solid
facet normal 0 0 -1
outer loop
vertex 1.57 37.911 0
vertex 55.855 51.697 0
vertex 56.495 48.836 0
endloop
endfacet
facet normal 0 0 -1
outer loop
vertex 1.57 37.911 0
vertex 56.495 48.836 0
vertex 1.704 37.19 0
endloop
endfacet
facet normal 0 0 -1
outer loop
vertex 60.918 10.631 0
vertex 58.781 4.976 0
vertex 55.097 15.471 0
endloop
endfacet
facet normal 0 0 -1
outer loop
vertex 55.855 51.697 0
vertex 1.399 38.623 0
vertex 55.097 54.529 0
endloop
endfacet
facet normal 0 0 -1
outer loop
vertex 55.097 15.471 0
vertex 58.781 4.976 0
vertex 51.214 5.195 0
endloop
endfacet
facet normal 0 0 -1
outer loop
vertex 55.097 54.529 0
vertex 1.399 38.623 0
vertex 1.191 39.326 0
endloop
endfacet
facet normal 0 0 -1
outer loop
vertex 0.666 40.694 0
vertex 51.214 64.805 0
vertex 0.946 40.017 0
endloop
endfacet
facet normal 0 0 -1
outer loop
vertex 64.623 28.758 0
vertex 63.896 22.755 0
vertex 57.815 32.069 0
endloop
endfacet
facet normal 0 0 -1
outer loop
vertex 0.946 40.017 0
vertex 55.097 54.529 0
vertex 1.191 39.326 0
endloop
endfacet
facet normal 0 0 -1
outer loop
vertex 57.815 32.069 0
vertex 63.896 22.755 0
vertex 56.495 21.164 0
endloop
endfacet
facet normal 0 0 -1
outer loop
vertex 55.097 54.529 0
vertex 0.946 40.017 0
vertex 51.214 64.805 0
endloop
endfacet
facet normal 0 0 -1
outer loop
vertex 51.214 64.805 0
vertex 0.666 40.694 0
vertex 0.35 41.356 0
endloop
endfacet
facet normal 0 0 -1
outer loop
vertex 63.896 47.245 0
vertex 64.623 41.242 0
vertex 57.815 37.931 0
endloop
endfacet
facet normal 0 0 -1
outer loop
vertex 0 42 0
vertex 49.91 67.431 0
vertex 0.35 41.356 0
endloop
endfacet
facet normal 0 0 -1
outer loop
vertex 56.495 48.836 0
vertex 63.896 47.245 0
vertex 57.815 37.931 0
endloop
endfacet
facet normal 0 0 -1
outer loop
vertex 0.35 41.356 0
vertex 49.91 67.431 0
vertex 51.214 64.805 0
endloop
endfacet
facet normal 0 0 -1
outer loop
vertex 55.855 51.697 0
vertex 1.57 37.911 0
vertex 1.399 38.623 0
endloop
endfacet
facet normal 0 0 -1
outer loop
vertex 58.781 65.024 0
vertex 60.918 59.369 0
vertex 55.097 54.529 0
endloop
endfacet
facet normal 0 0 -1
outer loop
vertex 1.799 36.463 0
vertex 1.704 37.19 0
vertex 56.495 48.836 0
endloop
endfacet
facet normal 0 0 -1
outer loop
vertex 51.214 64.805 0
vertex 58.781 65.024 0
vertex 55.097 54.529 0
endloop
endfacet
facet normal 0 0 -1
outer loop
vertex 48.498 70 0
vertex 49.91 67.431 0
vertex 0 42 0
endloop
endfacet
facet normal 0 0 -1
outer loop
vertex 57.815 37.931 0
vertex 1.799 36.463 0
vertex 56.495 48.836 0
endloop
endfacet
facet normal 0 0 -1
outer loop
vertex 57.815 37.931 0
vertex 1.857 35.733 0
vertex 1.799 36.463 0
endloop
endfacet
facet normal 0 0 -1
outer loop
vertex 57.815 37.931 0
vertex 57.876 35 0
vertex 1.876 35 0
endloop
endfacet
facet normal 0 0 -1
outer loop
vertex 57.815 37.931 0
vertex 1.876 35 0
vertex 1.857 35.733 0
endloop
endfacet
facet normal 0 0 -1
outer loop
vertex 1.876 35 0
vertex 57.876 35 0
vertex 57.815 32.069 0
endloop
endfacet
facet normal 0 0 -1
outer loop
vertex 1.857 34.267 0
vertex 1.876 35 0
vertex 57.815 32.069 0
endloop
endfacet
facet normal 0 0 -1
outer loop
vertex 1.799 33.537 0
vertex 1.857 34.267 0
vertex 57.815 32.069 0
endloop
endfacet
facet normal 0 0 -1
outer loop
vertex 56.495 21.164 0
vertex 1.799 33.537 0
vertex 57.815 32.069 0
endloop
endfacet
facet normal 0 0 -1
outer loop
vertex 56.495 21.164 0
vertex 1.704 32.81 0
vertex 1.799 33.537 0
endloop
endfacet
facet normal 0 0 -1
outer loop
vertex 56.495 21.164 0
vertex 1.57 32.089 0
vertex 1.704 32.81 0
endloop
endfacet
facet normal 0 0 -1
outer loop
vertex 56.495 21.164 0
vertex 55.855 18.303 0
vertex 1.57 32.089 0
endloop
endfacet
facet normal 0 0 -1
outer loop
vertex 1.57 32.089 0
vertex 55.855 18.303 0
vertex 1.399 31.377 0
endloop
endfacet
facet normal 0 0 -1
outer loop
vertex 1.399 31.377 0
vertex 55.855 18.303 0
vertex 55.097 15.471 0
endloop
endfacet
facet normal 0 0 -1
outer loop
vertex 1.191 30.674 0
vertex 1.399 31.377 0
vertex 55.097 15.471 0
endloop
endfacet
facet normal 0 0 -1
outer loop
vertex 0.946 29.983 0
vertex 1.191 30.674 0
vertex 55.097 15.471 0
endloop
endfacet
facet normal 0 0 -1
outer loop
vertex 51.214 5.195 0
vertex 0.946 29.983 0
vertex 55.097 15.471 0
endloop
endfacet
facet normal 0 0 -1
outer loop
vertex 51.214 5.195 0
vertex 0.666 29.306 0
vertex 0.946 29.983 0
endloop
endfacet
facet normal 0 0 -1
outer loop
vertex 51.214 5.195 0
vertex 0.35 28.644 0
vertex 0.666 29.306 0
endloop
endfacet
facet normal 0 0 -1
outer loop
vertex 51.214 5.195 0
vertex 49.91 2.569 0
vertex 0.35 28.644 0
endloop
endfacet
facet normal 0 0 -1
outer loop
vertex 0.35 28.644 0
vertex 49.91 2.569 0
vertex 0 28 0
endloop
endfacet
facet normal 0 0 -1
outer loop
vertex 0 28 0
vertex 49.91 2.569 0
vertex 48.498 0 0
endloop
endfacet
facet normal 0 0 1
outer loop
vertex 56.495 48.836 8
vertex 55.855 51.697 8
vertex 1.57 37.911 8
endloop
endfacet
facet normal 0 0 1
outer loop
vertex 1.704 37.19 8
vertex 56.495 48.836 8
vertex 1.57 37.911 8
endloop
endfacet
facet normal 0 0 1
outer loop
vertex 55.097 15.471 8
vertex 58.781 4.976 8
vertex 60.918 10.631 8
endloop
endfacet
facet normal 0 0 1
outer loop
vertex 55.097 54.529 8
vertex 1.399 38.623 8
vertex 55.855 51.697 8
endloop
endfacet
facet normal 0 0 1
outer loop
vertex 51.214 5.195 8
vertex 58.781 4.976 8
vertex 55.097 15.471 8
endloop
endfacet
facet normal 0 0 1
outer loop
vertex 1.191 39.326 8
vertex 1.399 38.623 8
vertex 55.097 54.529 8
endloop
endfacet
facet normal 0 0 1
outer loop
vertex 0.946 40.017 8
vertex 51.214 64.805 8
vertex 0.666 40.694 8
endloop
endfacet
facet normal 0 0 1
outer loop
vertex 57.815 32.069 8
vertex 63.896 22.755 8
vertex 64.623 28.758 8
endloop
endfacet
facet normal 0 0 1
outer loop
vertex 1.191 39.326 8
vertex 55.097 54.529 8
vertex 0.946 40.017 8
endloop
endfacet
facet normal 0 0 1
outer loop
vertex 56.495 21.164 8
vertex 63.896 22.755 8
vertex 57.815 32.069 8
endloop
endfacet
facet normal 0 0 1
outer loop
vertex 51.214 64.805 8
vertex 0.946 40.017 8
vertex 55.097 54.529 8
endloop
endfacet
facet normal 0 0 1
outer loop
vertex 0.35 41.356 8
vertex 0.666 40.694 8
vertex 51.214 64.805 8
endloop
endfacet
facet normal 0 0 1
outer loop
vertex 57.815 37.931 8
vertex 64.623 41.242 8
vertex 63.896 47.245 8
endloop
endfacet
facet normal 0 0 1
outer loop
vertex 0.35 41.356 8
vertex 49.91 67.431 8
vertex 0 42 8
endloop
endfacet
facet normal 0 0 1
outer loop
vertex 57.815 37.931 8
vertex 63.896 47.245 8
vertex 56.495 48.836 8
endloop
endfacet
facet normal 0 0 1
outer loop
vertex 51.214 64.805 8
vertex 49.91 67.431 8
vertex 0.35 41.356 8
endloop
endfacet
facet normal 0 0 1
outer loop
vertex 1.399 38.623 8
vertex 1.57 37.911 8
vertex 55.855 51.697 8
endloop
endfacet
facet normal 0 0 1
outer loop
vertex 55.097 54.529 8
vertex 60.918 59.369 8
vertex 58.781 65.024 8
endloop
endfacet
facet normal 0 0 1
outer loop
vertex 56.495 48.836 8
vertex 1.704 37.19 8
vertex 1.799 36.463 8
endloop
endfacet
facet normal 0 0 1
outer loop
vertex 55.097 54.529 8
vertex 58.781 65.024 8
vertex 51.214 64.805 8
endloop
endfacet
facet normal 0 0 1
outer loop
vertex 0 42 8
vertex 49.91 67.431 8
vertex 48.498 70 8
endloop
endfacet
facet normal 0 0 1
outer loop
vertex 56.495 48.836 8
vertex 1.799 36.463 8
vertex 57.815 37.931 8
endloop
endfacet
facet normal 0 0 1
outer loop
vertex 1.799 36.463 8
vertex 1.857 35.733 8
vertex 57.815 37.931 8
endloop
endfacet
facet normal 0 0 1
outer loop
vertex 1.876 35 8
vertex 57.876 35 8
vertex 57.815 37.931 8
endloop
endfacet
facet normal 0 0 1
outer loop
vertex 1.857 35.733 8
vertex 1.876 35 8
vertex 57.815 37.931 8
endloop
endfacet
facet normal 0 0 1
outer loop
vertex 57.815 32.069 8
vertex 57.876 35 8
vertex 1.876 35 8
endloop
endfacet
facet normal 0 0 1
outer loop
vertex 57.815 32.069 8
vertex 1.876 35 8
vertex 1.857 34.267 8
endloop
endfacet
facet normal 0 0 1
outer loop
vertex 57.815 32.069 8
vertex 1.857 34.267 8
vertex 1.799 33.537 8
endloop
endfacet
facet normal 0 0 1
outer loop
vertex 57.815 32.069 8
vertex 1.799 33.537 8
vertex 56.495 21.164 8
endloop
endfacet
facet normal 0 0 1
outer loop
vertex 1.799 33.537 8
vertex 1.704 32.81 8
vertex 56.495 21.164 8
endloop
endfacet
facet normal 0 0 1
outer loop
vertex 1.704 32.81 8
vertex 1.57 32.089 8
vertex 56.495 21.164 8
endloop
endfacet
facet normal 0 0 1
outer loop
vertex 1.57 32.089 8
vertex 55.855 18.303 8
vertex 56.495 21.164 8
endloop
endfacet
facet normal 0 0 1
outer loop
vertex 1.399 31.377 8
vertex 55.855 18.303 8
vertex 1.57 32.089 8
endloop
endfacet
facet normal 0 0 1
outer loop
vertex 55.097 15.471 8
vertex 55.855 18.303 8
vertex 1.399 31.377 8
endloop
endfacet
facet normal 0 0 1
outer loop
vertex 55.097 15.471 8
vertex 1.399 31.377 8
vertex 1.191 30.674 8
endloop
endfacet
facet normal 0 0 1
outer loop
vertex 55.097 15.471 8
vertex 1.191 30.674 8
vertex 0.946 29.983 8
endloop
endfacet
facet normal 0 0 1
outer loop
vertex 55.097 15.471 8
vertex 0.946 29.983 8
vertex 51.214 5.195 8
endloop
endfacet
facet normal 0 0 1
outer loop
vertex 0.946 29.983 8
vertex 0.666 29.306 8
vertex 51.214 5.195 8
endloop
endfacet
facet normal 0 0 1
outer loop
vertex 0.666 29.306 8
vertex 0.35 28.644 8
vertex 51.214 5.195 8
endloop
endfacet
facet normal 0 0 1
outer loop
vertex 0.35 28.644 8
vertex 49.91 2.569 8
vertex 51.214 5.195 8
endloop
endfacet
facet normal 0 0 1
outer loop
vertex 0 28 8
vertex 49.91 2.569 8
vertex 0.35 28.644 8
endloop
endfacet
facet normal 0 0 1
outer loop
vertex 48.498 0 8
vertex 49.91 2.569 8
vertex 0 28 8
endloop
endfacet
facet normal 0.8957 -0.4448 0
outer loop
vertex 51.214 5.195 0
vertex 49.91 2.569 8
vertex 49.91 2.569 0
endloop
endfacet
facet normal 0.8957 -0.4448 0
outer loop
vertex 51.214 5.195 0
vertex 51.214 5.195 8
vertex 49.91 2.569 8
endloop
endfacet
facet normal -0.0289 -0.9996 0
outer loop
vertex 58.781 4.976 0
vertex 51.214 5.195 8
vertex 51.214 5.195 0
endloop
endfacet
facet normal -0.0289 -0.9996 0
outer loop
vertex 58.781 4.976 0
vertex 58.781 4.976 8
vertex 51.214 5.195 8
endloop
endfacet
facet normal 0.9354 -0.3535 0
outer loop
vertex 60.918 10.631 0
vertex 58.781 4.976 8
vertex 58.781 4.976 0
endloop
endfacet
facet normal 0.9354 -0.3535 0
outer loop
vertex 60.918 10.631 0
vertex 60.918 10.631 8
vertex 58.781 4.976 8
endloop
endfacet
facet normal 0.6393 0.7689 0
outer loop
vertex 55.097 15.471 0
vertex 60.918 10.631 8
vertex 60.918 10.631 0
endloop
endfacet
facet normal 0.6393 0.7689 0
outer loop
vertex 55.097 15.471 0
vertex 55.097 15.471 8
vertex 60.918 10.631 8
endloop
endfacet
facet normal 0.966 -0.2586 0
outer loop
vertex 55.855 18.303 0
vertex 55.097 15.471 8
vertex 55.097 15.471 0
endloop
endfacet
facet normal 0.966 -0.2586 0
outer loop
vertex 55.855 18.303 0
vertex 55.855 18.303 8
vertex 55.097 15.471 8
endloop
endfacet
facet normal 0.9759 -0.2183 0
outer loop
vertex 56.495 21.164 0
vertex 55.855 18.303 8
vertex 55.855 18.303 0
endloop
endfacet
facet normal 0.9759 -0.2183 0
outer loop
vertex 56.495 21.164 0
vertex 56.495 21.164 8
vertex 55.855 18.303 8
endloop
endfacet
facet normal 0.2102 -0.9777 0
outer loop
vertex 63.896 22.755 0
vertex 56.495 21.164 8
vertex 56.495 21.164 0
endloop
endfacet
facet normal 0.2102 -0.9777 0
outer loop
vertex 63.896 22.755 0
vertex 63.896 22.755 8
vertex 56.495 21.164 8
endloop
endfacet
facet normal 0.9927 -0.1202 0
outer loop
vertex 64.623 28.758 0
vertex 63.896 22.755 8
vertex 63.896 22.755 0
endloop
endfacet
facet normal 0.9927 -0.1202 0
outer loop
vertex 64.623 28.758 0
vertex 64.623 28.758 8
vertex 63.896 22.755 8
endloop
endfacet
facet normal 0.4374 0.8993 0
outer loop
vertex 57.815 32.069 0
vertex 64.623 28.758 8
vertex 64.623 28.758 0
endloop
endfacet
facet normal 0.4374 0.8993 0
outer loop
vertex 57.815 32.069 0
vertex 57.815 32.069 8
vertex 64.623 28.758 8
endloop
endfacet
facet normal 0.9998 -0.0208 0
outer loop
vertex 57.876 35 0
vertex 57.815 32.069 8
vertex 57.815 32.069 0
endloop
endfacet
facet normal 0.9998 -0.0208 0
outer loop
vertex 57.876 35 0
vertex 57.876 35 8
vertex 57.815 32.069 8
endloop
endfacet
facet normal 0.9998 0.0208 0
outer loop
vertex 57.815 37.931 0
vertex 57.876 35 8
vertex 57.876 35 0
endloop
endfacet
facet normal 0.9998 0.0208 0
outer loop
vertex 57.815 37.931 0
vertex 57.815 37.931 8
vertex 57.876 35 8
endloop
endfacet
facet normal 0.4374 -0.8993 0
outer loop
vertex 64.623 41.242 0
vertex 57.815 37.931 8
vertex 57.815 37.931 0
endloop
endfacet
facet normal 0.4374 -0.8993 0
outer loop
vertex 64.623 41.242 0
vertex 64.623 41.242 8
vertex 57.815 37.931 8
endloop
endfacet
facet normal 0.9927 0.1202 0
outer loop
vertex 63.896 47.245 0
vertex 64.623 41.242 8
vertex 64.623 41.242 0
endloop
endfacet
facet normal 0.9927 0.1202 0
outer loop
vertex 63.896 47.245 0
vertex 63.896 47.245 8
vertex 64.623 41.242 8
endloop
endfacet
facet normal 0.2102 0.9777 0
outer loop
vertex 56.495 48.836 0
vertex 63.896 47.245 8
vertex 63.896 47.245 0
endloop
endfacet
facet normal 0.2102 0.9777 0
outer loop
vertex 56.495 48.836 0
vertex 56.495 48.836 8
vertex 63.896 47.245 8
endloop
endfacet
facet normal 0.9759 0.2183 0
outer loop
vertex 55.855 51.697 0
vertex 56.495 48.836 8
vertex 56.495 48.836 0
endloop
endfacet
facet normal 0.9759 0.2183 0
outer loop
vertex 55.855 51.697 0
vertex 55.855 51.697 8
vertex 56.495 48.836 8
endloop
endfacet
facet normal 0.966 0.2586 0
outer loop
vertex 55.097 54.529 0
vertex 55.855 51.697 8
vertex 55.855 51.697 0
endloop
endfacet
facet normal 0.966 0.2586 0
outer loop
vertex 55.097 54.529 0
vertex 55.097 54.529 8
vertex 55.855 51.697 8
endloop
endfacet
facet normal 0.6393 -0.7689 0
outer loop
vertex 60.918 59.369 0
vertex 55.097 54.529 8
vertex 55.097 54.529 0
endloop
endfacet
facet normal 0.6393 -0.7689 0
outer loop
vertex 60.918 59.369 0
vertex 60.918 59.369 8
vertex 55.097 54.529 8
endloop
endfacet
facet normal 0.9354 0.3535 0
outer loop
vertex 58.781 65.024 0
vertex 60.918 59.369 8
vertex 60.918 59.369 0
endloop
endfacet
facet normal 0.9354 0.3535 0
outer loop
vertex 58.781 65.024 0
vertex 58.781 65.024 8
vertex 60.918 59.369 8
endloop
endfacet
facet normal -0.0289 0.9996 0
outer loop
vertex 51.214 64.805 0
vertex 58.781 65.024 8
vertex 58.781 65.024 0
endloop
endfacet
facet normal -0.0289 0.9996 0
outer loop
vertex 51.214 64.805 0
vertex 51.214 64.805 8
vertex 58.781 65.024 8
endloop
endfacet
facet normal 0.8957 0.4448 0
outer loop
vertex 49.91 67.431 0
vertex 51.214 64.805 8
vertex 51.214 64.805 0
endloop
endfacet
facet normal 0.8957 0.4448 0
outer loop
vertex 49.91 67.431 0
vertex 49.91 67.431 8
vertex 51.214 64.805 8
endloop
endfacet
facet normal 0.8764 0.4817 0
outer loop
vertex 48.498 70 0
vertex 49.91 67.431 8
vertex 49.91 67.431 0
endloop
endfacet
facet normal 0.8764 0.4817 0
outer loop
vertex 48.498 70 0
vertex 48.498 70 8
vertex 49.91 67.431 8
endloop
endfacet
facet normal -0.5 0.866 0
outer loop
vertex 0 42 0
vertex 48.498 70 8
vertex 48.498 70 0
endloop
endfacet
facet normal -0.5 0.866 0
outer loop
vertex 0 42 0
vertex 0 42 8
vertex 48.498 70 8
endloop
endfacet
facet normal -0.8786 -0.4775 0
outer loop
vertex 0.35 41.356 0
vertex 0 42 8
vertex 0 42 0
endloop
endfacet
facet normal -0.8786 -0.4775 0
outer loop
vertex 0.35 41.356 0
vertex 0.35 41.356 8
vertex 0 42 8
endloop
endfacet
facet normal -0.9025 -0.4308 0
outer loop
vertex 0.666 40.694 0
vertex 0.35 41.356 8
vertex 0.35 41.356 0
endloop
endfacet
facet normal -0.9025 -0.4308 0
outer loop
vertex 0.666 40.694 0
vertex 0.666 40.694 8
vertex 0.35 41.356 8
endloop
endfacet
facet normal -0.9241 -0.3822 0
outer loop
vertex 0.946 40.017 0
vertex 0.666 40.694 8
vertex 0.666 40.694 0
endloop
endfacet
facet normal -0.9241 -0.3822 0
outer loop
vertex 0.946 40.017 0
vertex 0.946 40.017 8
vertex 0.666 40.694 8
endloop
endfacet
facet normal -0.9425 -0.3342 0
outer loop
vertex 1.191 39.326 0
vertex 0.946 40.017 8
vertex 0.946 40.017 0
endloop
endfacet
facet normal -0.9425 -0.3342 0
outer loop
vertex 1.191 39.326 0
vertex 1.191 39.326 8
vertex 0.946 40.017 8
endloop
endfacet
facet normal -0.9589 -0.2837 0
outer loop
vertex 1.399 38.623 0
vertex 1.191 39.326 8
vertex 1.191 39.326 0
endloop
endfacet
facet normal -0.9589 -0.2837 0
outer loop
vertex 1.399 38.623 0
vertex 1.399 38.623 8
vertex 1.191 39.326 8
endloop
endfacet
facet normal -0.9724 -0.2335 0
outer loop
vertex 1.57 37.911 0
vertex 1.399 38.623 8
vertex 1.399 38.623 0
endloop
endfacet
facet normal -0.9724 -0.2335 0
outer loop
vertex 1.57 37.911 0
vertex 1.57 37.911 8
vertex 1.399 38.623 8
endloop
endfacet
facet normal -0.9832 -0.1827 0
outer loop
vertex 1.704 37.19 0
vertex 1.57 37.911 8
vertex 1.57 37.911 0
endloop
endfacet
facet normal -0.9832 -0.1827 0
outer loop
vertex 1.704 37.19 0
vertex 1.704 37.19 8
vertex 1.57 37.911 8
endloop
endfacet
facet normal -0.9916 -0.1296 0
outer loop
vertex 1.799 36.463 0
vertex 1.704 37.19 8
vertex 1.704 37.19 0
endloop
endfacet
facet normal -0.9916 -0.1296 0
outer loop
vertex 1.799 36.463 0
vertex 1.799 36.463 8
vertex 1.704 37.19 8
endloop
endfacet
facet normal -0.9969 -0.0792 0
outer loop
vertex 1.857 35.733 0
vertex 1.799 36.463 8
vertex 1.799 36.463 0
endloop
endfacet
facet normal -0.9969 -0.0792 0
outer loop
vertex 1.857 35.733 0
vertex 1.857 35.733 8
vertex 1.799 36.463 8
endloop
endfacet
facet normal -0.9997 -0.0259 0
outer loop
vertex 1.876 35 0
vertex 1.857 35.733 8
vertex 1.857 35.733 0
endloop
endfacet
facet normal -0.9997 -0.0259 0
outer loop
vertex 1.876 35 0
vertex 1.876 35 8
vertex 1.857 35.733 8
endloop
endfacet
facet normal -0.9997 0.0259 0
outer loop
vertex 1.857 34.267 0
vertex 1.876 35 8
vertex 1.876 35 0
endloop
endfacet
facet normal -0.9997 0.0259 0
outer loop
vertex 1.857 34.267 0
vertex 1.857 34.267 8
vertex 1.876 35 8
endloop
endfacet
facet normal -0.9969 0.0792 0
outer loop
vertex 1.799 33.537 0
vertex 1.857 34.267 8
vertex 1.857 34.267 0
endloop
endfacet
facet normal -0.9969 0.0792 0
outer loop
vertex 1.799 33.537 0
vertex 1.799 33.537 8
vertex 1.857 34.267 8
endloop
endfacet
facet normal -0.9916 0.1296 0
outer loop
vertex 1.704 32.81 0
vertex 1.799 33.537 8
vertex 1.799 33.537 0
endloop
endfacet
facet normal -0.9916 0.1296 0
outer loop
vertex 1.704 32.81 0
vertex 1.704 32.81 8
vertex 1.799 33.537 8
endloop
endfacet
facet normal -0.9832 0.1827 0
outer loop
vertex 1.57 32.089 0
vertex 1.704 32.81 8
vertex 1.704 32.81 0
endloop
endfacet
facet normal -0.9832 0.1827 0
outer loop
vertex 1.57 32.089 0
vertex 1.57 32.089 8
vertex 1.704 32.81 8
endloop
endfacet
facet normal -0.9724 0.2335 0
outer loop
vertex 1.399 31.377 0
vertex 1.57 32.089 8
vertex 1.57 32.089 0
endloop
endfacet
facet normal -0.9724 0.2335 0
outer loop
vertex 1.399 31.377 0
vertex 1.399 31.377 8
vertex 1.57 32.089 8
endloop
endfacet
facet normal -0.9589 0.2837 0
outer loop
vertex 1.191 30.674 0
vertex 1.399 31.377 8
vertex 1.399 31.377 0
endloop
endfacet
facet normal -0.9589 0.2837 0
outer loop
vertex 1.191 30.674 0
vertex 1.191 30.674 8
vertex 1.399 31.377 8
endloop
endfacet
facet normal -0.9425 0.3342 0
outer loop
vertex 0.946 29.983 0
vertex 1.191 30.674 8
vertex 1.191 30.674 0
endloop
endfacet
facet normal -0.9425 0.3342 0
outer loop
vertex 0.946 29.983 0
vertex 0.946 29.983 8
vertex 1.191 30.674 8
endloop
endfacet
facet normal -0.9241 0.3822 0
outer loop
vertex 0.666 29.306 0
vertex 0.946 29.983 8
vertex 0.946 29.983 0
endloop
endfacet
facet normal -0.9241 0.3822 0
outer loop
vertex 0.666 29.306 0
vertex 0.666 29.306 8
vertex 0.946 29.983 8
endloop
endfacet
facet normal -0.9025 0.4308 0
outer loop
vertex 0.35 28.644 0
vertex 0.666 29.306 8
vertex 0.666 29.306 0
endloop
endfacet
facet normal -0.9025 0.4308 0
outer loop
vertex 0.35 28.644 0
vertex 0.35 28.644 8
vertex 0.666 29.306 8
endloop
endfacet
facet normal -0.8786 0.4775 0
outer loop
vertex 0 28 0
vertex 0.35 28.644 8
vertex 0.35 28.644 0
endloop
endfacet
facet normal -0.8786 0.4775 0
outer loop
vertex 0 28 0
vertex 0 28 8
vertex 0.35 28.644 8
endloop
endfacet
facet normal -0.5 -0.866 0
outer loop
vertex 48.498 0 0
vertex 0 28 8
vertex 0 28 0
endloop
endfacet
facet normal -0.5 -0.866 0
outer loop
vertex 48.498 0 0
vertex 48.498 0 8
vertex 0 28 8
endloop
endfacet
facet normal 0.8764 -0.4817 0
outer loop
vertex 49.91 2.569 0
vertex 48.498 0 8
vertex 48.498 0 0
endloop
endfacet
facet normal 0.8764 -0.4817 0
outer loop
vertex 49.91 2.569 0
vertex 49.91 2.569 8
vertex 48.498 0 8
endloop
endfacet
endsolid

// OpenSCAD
$fn = 32;
// target_bbox: 64.623, 70, 8
// ----------------------------------------------------------------------
// Gear sector: 4 teeth on 60 degrees
// ----------------------------------------------------------------------

// --- parameters (mm) ---
sector_angle = 60;        // sector angle, degrees
root_r = 70;              // root circle radius
tooth_h = 7;              // tooth height over the root circle
teeth = 4;                // number of teeth on the sector
hub_r = 14;               // hub bore radius
plate_t = 8;              // sector thickness, Z
arc_step = 3;             // sampling step of the root/hub arcs, degrees

tip_r = root_r + tooth_h;  // tip circle radius

profile = [[48.498, 0], [49.91, 2.569], [51.214, 5.195], [58.781, 4.976], [60.918, 10.631], [55.097, 15.471], [55.855, 18.303], [56.495, 21.164], [63.896, 22.755], [64.623, 28.758], [57.815, 32.069], [57.876, 35], [57.815, 37.931], [64.623, 41.242], [63.896, 47.245], [56.495, 48.836], [55.855, 51.697], [55.097, 54.529], [60.918, 59.369], [58.781, 65.024], [51.214, 64.805], [49.91, 67.431], [48.498, 70], [0, 42], [0.35, 41.356], [0.666, 40.694], [0.946, 40.017], [1.191, 39.326], [1.399, 38.623], [1.57, 37.911], [1.704, 37.19], [1.799, 36.463], [1.857, 35.733], [1.876, 35], [1.857, 34.267], [1.799, 33.537], [1.704, 32.81], [1.57, 32.089], [1.399, 31.377], [1.191, 30.674], [0.946, 29.983], [0.666, 29.306], [0.35, 28.644], [0, 28]];  // primary outline, 44 points, counter clockwise

// --- the one profile operation ---
linear_extrude(height = plate_t) polygon(points = profile);
